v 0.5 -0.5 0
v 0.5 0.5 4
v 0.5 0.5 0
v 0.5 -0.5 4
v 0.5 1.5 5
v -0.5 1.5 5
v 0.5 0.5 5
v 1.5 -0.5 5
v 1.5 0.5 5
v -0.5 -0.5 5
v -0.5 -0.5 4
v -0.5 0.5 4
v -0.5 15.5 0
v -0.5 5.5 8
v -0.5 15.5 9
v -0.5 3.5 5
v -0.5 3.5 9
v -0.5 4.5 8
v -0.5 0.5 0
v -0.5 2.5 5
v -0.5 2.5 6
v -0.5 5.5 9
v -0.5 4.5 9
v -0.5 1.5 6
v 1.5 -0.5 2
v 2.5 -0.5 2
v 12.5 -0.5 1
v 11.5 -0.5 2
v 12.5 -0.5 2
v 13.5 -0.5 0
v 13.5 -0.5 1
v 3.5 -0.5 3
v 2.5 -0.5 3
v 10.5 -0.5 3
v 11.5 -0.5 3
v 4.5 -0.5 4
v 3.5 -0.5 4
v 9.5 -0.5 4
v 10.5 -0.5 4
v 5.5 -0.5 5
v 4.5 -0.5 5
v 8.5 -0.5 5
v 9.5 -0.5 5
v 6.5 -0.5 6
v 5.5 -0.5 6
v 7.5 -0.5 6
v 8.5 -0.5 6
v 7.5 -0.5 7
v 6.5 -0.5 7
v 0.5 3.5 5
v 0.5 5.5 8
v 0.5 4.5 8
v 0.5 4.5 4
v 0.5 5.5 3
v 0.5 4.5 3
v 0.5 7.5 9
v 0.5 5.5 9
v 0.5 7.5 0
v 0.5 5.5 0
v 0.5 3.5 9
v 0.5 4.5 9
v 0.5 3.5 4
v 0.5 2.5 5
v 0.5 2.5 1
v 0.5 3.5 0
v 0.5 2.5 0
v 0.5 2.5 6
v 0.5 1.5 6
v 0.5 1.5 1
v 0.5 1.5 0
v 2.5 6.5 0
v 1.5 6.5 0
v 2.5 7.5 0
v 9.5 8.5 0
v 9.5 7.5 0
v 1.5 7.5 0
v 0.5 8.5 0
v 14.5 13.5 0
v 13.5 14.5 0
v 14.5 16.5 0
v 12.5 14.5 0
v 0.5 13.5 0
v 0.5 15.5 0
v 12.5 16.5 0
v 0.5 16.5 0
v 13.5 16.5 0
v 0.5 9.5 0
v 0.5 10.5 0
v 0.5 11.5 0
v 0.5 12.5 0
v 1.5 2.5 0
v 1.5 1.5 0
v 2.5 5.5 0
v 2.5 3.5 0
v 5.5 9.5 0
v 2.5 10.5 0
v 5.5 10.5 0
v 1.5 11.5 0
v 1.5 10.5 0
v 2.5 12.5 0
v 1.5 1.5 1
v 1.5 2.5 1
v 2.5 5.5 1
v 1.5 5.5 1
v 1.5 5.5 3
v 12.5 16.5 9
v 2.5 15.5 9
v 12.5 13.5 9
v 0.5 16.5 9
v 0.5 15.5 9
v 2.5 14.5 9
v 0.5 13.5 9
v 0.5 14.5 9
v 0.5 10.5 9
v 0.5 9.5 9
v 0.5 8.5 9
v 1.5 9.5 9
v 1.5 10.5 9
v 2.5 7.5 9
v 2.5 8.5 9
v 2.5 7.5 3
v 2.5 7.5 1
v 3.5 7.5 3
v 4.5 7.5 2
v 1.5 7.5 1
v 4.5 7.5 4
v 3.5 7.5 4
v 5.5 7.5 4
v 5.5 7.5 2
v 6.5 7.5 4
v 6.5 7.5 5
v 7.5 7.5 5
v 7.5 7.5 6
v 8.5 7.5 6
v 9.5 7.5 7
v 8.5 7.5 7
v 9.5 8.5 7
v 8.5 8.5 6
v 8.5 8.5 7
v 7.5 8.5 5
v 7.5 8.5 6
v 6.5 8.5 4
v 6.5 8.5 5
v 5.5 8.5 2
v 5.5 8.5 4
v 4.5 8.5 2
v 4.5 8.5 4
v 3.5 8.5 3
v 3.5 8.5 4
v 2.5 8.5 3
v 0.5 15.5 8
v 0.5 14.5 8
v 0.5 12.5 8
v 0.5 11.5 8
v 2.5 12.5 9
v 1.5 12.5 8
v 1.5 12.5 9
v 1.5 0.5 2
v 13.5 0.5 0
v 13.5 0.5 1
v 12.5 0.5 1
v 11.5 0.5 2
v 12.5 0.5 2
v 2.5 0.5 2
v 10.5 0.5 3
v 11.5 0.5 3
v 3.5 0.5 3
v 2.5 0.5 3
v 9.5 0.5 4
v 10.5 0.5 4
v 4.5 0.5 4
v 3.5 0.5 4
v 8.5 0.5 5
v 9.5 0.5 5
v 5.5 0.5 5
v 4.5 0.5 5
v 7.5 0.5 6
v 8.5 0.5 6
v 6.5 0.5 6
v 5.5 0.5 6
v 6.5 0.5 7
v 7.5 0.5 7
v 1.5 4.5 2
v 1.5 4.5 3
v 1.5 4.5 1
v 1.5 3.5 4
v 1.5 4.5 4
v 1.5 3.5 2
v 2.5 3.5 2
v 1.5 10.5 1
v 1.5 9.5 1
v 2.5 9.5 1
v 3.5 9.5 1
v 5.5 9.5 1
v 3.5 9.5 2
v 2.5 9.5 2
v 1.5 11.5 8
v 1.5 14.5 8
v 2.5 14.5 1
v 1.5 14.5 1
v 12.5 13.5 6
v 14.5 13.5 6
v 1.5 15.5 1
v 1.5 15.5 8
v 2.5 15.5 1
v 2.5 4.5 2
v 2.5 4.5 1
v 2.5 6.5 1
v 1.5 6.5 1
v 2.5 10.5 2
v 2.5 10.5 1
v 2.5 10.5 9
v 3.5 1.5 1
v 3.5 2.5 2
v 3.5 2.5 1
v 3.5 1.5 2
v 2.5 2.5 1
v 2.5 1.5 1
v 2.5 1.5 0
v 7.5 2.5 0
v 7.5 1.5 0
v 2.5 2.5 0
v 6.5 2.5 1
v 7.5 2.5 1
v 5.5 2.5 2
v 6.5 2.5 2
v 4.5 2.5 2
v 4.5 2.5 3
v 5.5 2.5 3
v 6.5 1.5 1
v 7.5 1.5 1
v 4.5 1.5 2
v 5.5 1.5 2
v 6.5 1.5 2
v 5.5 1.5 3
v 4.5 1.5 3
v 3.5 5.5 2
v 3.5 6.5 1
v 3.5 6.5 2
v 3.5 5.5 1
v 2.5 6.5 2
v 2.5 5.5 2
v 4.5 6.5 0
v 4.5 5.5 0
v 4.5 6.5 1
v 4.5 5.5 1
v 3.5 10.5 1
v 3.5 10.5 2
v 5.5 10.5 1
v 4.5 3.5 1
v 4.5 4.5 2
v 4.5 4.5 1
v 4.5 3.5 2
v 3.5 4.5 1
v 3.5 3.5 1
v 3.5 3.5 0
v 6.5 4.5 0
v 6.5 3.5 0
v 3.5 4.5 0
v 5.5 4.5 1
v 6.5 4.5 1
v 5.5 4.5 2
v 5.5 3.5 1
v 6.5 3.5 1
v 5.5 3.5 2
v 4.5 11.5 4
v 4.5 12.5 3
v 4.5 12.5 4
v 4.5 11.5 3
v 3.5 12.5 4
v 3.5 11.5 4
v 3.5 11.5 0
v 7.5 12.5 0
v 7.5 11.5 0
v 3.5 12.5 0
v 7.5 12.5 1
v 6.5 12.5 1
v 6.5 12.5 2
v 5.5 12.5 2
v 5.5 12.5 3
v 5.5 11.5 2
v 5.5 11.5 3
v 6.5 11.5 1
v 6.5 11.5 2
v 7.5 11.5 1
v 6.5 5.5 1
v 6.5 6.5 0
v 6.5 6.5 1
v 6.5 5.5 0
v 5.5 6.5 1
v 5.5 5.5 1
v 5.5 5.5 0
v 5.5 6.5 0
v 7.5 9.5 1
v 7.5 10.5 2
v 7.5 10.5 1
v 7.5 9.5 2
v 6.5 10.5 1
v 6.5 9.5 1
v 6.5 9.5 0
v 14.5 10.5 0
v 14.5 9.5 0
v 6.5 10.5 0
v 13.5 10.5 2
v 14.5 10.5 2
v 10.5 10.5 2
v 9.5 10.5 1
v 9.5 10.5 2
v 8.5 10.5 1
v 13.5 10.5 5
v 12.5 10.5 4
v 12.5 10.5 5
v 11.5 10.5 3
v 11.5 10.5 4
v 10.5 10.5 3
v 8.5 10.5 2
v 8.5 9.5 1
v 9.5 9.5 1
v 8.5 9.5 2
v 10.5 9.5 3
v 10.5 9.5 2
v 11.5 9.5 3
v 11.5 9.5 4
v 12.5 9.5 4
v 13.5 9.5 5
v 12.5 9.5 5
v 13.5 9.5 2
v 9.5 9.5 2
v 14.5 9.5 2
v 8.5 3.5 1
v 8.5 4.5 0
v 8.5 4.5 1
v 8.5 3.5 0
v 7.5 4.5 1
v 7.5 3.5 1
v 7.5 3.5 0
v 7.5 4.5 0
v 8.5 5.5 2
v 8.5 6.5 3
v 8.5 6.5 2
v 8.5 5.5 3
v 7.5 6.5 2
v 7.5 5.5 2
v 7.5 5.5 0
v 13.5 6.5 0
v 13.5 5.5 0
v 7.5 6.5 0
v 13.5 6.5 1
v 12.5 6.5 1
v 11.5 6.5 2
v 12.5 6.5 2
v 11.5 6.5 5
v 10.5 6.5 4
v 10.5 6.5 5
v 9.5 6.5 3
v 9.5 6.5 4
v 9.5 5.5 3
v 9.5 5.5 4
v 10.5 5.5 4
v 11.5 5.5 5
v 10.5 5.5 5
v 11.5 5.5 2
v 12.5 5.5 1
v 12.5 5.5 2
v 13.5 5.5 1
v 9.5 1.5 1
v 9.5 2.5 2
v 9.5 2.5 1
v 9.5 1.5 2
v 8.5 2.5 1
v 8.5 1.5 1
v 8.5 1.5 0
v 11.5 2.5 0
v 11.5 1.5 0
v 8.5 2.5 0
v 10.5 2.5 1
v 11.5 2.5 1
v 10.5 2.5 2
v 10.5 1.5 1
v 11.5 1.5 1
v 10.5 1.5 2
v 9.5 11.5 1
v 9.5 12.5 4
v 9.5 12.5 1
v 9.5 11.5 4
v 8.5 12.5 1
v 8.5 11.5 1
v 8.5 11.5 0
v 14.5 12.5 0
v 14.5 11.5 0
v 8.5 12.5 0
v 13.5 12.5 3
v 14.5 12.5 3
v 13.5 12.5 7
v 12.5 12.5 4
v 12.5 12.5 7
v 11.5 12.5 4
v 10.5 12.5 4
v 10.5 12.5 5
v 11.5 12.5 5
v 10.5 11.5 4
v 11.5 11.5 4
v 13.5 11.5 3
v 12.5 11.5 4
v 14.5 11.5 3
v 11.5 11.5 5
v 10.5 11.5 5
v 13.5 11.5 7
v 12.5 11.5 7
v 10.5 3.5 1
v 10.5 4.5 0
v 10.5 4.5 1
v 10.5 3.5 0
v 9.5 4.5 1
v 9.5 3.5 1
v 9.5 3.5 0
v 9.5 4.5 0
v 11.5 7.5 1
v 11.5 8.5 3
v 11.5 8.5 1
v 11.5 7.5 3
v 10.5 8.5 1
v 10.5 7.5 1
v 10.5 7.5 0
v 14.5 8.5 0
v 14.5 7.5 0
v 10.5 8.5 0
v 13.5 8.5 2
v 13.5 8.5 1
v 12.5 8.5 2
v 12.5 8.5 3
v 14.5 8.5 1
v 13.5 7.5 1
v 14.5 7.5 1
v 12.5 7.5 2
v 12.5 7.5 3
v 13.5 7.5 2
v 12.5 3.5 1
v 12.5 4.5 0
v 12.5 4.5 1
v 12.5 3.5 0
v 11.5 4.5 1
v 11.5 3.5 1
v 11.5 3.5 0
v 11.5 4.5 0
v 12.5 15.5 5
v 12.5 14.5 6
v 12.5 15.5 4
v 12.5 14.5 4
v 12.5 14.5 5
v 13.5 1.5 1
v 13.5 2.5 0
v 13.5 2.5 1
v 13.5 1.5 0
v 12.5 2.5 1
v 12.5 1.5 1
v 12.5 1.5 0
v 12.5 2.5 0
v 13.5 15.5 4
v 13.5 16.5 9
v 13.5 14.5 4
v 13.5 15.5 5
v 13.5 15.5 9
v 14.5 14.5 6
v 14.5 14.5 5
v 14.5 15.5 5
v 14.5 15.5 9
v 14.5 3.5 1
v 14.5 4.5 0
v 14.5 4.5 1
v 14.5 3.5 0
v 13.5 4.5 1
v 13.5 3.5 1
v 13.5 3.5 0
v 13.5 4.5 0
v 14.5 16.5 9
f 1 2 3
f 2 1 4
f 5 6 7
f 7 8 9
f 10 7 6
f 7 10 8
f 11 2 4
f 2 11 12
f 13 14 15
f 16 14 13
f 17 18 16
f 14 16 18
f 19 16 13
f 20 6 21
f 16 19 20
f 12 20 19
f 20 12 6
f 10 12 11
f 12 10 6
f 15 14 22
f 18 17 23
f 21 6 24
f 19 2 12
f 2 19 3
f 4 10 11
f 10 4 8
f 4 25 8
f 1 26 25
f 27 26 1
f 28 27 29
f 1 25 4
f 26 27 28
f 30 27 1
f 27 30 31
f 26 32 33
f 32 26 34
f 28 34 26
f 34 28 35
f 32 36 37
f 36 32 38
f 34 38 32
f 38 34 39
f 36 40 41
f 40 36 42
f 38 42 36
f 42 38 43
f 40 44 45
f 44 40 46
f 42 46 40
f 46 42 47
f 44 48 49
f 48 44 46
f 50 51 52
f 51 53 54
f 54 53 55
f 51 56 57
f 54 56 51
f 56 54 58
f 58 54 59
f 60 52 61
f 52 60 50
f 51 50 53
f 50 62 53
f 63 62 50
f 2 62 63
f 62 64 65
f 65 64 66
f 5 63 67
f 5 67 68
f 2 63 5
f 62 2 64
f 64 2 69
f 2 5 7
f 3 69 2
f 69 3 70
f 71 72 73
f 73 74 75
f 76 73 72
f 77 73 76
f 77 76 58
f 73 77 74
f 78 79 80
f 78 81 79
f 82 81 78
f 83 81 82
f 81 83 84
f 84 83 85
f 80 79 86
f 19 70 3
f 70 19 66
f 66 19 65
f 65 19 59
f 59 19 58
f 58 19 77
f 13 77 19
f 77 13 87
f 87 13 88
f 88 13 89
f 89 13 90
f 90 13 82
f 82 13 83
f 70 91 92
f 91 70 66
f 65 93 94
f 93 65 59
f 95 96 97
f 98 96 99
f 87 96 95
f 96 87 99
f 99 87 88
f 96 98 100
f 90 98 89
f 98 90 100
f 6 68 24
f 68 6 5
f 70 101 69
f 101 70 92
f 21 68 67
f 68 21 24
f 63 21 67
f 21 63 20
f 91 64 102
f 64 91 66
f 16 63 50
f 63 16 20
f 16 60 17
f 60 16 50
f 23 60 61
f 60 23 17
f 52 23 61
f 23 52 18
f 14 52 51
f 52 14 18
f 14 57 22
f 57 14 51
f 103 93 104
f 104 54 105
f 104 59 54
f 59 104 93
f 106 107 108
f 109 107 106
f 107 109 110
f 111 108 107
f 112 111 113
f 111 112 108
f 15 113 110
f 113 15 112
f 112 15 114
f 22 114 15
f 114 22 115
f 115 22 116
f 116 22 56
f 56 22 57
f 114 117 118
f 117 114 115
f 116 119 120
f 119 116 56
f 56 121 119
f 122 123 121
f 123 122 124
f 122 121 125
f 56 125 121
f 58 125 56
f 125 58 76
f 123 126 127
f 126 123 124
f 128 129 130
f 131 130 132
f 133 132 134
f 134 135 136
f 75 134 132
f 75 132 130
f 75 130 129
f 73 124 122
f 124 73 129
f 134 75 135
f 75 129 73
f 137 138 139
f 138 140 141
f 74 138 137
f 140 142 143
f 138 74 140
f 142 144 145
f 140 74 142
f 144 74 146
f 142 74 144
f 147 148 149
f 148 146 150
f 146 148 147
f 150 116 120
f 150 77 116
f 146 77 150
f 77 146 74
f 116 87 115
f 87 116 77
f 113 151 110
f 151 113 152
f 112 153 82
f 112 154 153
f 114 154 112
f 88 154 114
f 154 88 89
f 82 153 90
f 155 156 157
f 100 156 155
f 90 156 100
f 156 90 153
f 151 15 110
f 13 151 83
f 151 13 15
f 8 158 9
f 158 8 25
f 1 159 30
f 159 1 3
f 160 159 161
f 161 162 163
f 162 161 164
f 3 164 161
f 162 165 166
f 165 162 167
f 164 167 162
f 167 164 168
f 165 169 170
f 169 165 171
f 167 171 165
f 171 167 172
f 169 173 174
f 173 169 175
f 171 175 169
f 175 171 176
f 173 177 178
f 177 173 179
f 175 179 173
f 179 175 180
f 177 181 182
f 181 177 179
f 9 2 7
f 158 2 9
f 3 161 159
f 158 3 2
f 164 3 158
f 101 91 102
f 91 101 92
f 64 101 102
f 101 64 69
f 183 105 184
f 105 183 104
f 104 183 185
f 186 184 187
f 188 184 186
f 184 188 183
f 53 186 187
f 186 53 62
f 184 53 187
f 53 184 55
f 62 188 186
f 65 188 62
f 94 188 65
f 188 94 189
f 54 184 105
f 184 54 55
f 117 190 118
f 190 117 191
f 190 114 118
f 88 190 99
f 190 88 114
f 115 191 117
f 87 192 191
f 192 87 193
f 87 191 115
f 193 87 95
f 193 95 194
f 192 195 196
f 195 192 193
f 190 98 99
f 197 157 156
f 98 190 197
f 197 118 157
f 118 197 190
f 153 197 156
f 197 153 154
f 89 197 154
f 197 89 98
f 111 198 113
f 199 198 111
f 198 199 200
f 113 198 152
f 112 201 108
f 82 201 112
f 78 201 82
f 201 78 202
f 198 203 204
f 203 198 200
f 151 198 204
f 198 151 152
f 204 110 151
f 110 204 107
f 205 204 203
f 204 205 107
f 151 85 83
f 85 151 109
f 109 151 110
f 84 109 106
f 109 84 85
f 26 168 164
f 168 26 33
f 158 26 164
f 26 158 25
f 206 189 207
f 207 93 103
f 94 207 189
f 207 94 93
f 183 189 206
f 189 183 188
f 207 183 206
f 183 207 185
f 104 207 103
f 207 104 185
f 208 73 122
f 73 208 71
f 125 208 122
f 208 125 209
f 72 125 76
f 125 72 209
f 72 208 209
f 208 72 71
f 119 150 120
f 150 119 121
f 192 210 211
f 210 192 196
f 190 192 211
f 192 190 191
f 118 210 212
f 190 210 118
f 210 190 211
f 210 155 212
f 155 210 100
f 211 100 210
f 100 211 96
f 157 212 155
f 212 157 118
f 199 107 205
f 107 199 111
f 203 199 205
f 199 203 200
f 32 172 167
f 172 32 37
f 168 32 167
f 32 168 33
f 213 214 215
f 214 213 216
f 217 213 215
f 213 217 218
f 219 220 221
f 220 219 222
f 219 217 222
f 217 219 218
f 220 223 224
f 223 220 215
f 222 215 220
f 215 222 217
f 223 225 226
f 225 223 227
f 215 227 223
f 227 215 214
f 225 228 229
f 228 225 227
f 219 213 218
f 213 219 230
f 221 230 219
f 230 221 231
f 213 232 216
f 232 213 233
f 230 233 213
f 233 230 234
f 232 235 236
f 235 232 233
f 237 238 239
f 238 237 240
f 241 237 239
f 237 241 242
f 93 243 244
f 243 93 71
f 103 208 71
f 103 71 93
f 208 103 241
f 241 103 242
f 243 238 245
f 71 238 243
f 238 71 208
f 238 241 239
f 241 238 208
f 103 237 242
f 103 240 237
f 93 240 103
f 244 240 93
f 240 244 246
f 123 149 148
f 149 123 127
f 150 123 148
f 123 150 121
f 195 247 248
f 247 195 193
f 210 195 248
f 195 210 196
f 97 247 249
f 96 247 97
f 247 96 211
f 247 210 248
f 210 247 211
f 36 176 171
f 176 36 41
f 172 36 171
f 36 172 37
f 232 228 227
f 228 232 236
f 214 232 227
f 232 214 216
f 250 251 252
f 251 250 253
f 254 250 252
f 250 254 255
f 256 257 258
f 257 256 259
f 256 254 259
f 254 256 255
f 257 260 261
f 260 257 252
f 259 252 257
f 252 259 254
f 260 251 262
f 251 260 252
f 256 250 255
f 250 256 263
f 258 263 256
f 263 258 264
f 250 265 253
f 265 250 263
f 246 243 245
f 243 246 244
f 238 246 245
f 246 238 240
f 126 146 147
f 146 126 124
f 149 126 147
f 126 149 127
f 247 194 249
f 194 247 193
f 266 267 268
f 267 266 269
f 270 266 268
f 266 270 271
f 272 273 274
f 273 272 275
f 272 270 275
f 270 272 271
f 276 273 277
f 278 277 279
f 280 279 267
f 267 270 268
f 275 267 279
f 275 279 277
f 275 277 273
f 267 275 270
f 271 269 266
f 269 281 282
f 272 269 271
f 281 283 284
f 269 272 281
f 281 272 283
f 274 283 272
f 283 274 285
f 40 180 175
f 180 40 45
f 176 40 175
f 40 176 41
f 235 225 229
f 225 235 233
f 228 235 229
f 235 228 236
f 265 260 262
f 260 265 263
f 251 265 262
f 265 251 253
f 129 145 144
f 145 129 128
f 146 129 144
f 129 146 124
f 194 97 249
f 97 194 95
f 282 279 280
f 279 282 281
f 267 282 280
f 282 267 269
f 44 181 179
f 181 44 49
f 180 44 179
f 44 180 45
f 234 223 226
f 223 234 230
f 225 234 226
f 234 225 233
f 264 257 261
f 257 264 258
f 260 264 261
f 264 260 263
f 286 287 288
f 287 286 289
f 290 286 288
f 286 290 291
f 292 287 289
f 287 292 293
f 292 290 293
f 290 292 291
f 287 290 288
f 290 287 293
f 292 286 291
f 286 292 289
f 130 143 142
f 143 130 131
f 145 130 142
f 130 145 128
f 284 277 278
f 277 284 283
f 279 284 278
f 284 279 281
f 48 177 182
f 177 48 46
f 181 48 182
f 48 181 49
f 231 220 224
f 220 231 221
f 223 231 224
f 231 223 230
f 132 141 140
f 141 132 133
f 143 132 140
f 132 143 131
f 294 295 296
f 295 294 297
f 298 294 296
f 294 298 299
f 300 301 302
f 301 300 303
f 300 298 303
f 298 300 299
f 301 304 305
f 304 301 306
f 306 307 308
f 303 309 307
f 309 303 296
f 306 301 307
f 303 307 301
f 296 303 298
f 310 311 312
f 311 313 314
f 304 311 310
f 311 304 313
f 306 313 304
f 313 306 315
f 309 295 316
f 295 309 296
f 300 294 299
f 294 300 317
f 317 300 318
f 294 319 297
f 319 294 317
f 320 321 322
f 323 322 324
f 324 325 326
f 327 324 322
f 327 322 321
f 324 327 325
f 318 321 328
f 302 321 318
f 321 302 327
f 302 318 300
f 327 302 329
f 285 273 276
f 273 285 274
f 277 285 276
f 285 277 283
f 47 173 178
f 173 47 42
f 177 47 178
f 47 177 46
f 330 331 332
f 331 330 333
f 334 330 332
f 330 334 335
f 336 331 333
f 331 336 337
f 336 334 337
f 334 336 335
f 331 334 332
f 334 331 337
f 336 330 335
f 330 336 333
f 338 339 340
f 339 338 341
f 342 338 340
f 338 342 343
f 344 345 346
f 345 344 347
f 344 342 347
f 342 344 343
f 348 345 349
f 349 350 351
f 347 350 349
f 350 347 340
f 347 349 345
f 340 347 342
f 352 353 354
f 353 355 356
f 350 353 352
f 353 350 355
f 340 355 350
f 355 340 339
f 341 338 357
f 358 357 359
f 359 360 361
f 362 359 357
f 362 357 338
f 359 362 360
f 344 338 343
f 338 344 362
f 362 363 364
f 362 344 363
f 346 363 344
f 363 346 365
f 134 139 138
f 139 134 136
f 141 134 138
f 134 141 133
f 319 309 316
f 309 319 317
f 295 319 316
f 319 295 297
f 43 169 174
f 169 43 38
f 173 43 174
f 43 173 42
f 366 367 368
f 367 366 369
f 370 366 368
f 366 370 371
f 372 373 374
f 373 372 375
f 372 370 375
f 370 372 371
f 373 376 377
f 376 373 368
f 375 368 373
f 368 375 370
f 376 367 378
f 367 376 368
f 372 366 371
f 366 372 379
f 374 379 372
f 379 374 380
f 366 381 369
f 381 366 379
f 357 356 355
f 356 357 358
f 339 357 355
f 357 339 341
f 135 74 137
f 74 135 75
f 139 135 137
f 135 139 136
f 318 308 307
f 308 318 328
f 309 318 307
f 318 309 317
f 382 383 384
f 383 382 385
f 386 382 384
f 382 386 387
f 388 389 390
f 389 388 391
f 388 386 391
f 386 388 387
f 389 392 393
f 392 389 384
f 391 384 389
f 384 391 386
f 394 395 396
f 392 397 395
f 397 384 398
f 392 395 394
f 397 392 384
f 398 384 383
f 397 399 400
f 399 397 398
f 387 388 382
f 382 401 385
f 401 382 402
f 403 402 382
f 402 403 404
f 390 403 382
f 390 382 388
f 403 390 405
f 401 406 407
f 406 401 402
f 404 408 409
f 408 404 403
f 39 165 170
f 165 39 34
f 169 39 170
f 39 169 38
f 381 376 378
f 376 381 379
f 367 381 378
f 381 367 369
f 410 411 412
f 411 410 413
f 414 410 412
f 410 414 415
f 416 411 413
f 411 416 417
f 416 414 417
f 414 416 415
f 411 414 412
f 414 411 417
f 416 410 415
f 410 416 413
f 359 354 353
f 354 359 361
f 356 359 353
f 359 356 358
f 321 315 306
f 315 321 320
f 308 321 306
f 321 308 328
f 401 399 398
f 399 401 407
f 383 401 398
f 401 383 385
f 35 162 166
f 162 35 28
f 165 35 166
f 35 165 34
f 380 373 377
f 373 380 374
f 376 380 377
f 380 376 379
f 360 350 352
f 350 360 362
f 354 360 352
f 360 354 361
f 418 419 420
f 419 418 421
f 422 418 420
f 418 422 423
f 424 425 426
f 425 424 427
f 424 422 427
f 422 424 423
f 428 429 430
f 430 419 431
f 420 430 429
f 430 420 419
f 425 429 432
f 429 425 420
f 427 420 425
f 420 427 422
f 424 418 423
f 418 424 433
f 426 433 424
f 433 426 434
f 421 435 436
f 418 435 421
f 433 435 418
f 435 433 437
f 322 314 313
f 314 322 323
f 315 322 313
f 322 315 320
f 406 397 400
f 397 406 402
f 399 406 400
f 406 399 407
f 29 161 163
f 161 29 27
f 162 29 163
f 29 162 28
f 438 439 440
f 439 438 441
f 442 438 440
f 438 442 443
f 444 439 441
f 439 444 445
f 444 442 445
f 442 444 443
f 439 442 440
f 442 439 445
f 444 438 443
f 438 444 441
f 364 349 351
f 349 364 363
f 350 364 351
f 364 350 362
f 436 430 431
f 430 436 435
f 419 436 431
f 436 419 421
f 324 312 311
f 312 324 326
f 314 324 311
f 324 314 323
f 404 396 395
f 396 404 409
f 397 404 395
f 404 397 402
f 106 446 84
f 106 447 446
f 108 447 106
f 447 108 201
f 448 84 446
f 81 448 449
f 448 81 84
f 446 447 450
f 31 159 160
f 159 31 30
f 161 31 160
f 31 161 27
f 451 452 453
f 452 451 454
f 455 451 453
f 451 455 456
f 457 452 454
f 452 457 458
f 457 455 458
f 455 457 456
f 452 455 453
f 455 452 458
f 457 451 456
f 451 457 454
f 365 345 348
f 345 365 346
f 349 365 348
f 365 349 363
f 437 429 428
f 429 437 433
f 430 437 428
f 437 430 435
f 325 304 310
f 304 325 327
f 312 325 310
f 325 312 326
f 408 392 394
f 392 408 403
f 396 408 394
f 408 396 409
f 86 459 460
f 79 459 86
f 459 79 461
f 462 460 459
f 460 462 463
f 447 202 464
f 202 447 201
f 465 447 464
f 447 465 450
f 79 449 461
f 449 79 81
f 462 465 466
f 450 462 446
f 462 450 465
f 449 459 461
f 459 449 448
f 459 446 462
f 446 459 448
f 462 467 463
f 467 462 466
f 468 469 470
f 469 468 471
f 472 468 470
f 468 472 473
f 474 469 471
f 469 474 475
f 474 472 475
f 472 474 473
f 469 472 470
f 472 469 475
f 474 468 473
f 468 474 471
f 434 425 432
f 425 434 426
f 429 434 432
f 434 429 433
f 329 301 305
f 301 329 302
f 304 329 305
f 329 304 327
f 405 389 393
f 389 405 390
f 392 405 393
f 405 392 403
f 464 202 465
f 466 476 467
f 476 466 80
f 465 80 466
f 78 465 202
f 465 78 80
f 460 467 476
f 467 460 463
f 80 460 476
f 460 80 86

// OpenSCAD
union() {
    translate([0, 0, 4.5]) color([1, 0, 0]) cube([1, 1, 1], center=true);
    translate([0, 1, 2.5]) cube([1, 1, 5], center=true);
    translate([0, 2, 3.0]) cube([1, 1, 6], center=true);
    translate([0, 3, 2.5]) cube([1, 1, 5], center=true);
    translate([0, 4, 4.5]) cube([1, 1, 9], center=true);
    translate([0, 5, 4.0]) cube([1, 1, 8], center=true);
    translate([0, 6, 4.5]) cube([1, 1, 9], center=true);
    translate([0, 7, 4.5]) cube([1, 1, 9], center=true);
    translate([0, 8, 4.5]) cube([1, 1, 9], center=true);
    translate([0, 9, 4.5]) cube([1, 1, 9], center=true);
    translate([0, 10, 4.5]) cube([1, 1, 9], center=true);
    translate([0, 11, 4.5]) cube([1, 1, 9], center=true);
    translate([0, 12, 4.5]) cube([1, 1, 9], center=true);
    translate([0, 13, 4.5]) cube([1, 1, 9], center=true);
    translate([0, 14, 4.5]) cube([1, 1, 9], center=true);
    translate([0, 15, 4.5]) cube([1, 1, 9], center=true);
    translate([1, 0, 2.5]) cube([1, 1, 5], center=true);
    translate([1, 2, 0.5]) cube([1, 1, 1], center=true);
    translate([1, 4, 2.0]) cube([1, 1, 4], center=true);
    translate([1, 5, 1.5]) cube([1, 1, 3], center=true);
    translate([1, 8, 4.5]) cube([1, 1, 9], center=true);
    translate([1, 10, 4.5]) cube([1, 1, 9], center=true);
    translate([1, 12, 4.0]) cube([1, 1, 8], center=true);
    translate([1, 14, 4.5]) cube([1, 1, 9], center=true);
    translate([1, 15, 4.0]) cube([1, 1, 8], center=true);
    translate([1, 16, 4.5]) cube([1, 1, 9], center=true);
    translate([2, 0, 1.0]) cube([1, 1, 2], center=true);
    translate([2, 4, 1.0]) cube([1, 1, 2], center=true);
    translate([2, 5, 0.5]) cube([1, 1, 1], center=true);
    translate([2, 7, 0.5]) cube([1, 1, 1], center=true);
    translate([2, 8, 4.5]) cube([1, 1, 9], center=true);
    translate([2, 10, 0.5]) cube([1, 1, 1], center=true);
    translate([2, 11, 4.5]) cube([1, 1, 9], center=true);
    translate([2, 12, 4.5]) cube([1, 1, 9], center=true);
    translate([2, 14, 4.5]) cube([1, 1, 9], center=true);
    translate([2, 15, 0.5]) cube([1, 1, 1], center=true);
    translate([2, 16, 4.5]) cube([1, 1, 9], center=true);
    translate([3, 0, 1.5]) cube([1, 1, 3], center=true);
    translate([3, 2, 0.5]) cube([1, 1, 1], center=true);
    translate([3, 6, 1.0]) cube([1, 1, 2], center=true);
    translate([3, 8, 1.5]) cube([1, 1, 3], center=true);
    translate([3, 10, 1.0]) cube([1, 1, 2], center=true);
    translate([3, 14, 4.5]) cube([1, 1, 9], center=true);
    translate([3, 15, 4.5]) cube([1, 1, 9], center=true);
    translate([3, 16, 4.5]) cube([1, 1, 9], center=true);
    translate([4, 0, 2.0]) cube([1, 1, 4], center=true);
    translate([4, 2, 1.0]) cube([1, 1, 2], center=true);
    translate([4, 4, 0.5]) cube([1, 1, 1], center=true);
    translate([4, 6, 0.5]) cube([1, 1, 1], center=true);
    translate([4, 8, 2.0]) cube([1, 1, 4], center=true);
    translate([4, 10, 0.5]) cube([1, 1, 1], center=true);
    translate([4, 12, 2.0]) cube([1, 1, 4], center=true);
    translate([4, 14, 4.5]) cube([1, 1, 9], center=true);
    translate([4, 15, 4.5]) cube([1, 1, 9], center=true);
    translate([4, 16, 4.5]) cube([1, 1, 9], center=true);
    translate([5, 0, 2.5]) cube([1, 1, 5], center=true);
    translate([5, 2, 1.5]) cube([1, 1, 3], center=true);
    translate([5, 4, 1.0]) cube([1, 1, 2], center=true);
    translate([5, 8, 1.0]) cube([1, 1, 2], center=true);
    translate([5, 10, 0.5]) cube([1, 1, 1], center=true);
    translate([5, 12, 1.5]) cube([1, 1, 3], center=true);
    translate([5, 14, 4.5]) cube([1, 1, 9], center=true);
    translate([5, 15, 4.5]) cube([1, 1, 9], center=true);
    translate([5, 16, 4.5]) cube([1, 1, 9], center=true);
    translate([6, 0, 3.0]) cube([1, 1, 6], center=true);
    translate([6, 2, 1.0]) cube([1, 1, 2], center=true);
    translate([6, 4, 0.5]) cube([1, 1, 1], center=true);
    translate([6, 6, 0.5]) cube([1, 1, 1], center=true);
    translate([6, 8, 2.0]) cube([1, 1, 4], center=true);
    translate([6, 12, 1.0]) cube([1, 1, 2], center=true);
    translate([6, 14, 4.5]) cube([1, 1, 9], center=true);
    translate([6, 15, 4.5]) cube([1, 1, 9], center=true);
    translate([6, 16, 4.5]) cube([1, 1, 9], center=true);
    translate([7, 0, 3.5]) cube([1, 1, 7], center=true);
    translate([7, 2, 0.5]) cube([1, 1, 1], center=true);
    translate([7, 8, 2.5]) cube([1, 1, 5], center=true);
    translate([7, 10, 0.5]) cube([1, 1, 1], center=true);
    translate([7, 12, 0.5]) cube([1, 1, 1], center=true);
    translate([7, 14, 4.5]) cube([1, 1, 9], center=true);
    translate([7, 15, 4.5]) cube([1, 1, 9], center=true);
    translate([7, 16, 4.5]) cube([1, 1, 9], center=true);
    translate([8, 0, 3.0]) cube([1, 1, 6], center=true);
    translate([8, 4, 0.5]) cube([1, 1, 1], center=true);
    translate([8, 6, 1.0]) cube([1, 1, 2], center=true);
    translate([8, 8, 3.0]) cube([1, 1, 6], center=true);
    translate([8, 10, 1.0]) cube([1, 1, 2], center=true);
    translate([8, 14, 4.5]) cube([1, 1, 9], center=true);
    translate([8, 15, 4.5]) cube([1, 1, 9], center=true);
    translate([8, 16, 4.5]) cube([1, 1, 9], center=true);
    translate([9, 0, 2.5]) cube([1, 1, 5], center=true);
    translate([9, 2, 0.5]) cube([1, 1, 1], center=true);
    translate([9, 6, 1.5]) cube([1, 1, 3], center=true);
    translate([9, 8, 3.5]) cube([1, 1, 7], center=true);
    translate([9, 10, 0.5]) cube([1, 1, 1], center=true);
    translate([9, 12, 0.5]) cube([1, 1, 1], center=true);
    translate([9, 14, 4.5]) cube([1, 1, 9], center=true);
    translate([9, 15, 4.5]) cube([1, 1, 9], center=true);
    translate([9, 16, 4.5]) cube([1, 1, 9], center=true);
    translate([10, 0, 2.0]) cube([1, 1, 4], center=true);
    translate([10, 2, 1.0]) cube([1, 1, 2], center=true);
    translate([10, 4, 0.5]) cube([1, 1, 1], center=true);
    translate([10, 6, 2.0]) cube([1, 1, 4], center=true);
    translate([10, 10, 1.0]) cube([1, 1, 2], center=true);
    translate([10, 12, 2.0]) cube([1, 1, 4], center=true);
    translate([10, 14, 4.5]) cube([1, 1, 9], center=true);
    translate([10, 15, 4.5]) cube([1, 1, 9], center=true);
    translate([10, 16, 4.5]) cube([1, 1, 9], center=true);
    translate([11, 0, 1.5]) cube([1, 1, 3], center=true);
    translate([11, 2, 0.5]) cube([1, 1, 1], center=true);
    translate([11, 6, 2.5]) cube([1, 1, 5], center=true);
    translate([11, 8, 0.5]) cube([1, 1, 1], center=true);
    translate([11, 10, 1.5]) cube([1, 1, 3], center=true);
    translate([11, 12, 2.5]) cube([1, 1, 5], center=true);
    translate([11, 14, 4.5]) cube([1, 1, 9], center=true);
    translate([11, 15, 4.5]) cube([1, 1, 9], center=true);
    translate([11, 16, 4.5]) cube([1, 1, 9], center=true);
    translate([12, 0, 1.0]) cube([1, 1, 2], center=true);
    translate([12, 4, 0.5]) cube([1, 1, 1], center=true);
    translate([12, 6, 1.0]) cube([1, 1, 2], center=true);
    translate([12, 8, 1.5]) cube([1, 1, 3], center=true);
    translate([12, 10, 2.0]) cube([1, 1, 4], center=true);
    translate([12, 12, 2.0]) cube([1, 1, 4], center=true);
    translate([12, 14, 4.5]) cube([1, 1, 9], center=true);
    translate([12, 15, 4.5]) cube([1, 1, 9], center=true);
    translate([12, 16, 4.5]) cube([1, 1, 9], center=true);
    translate([13, 0, 0.5]) cube([1, 1, 1], center=true);
    translate([13, 2, 0.5]) cube([1, 1, 1], center=true);
    translate([13, 6, 0.5]) cube([1, 1, 1], center=true);
    translate([13, 8, 1.0]) cube([1, 1, 2], center=true);
    translate([13, 10, 2.5]) cube([1, 1, 5], center=true);
    translate([13, 12, 3.5]) cube([1, 1, 7], center=true);
    translate([13, 14, 3.0]) cube([1, 1, 6], center=true);
    translate([13, 15, 4.5]) color([0, 0, 1]) cube([1, 1, 1], center=true);
    translate([14, 4, 0.5]) cube([1, 1, 1], center=true);
    translate([14, 8, 0.5]) cube([1, 1, 1], center=true);
    translate([14, 10, 1.0]) cube([1, 1, 2], center=true);
    translate([14, 12, 1.5]) cube([1, 1, 3], center=true);
    translate([14, 14, 3.0]) cube([1, 1, 6], center=true);
    translate([14, 15, 2.5]) cube([1, 1, 5], center=true);
    translate([14, 16, 4.5]) cube([1, 1, 9], center=true);
}
